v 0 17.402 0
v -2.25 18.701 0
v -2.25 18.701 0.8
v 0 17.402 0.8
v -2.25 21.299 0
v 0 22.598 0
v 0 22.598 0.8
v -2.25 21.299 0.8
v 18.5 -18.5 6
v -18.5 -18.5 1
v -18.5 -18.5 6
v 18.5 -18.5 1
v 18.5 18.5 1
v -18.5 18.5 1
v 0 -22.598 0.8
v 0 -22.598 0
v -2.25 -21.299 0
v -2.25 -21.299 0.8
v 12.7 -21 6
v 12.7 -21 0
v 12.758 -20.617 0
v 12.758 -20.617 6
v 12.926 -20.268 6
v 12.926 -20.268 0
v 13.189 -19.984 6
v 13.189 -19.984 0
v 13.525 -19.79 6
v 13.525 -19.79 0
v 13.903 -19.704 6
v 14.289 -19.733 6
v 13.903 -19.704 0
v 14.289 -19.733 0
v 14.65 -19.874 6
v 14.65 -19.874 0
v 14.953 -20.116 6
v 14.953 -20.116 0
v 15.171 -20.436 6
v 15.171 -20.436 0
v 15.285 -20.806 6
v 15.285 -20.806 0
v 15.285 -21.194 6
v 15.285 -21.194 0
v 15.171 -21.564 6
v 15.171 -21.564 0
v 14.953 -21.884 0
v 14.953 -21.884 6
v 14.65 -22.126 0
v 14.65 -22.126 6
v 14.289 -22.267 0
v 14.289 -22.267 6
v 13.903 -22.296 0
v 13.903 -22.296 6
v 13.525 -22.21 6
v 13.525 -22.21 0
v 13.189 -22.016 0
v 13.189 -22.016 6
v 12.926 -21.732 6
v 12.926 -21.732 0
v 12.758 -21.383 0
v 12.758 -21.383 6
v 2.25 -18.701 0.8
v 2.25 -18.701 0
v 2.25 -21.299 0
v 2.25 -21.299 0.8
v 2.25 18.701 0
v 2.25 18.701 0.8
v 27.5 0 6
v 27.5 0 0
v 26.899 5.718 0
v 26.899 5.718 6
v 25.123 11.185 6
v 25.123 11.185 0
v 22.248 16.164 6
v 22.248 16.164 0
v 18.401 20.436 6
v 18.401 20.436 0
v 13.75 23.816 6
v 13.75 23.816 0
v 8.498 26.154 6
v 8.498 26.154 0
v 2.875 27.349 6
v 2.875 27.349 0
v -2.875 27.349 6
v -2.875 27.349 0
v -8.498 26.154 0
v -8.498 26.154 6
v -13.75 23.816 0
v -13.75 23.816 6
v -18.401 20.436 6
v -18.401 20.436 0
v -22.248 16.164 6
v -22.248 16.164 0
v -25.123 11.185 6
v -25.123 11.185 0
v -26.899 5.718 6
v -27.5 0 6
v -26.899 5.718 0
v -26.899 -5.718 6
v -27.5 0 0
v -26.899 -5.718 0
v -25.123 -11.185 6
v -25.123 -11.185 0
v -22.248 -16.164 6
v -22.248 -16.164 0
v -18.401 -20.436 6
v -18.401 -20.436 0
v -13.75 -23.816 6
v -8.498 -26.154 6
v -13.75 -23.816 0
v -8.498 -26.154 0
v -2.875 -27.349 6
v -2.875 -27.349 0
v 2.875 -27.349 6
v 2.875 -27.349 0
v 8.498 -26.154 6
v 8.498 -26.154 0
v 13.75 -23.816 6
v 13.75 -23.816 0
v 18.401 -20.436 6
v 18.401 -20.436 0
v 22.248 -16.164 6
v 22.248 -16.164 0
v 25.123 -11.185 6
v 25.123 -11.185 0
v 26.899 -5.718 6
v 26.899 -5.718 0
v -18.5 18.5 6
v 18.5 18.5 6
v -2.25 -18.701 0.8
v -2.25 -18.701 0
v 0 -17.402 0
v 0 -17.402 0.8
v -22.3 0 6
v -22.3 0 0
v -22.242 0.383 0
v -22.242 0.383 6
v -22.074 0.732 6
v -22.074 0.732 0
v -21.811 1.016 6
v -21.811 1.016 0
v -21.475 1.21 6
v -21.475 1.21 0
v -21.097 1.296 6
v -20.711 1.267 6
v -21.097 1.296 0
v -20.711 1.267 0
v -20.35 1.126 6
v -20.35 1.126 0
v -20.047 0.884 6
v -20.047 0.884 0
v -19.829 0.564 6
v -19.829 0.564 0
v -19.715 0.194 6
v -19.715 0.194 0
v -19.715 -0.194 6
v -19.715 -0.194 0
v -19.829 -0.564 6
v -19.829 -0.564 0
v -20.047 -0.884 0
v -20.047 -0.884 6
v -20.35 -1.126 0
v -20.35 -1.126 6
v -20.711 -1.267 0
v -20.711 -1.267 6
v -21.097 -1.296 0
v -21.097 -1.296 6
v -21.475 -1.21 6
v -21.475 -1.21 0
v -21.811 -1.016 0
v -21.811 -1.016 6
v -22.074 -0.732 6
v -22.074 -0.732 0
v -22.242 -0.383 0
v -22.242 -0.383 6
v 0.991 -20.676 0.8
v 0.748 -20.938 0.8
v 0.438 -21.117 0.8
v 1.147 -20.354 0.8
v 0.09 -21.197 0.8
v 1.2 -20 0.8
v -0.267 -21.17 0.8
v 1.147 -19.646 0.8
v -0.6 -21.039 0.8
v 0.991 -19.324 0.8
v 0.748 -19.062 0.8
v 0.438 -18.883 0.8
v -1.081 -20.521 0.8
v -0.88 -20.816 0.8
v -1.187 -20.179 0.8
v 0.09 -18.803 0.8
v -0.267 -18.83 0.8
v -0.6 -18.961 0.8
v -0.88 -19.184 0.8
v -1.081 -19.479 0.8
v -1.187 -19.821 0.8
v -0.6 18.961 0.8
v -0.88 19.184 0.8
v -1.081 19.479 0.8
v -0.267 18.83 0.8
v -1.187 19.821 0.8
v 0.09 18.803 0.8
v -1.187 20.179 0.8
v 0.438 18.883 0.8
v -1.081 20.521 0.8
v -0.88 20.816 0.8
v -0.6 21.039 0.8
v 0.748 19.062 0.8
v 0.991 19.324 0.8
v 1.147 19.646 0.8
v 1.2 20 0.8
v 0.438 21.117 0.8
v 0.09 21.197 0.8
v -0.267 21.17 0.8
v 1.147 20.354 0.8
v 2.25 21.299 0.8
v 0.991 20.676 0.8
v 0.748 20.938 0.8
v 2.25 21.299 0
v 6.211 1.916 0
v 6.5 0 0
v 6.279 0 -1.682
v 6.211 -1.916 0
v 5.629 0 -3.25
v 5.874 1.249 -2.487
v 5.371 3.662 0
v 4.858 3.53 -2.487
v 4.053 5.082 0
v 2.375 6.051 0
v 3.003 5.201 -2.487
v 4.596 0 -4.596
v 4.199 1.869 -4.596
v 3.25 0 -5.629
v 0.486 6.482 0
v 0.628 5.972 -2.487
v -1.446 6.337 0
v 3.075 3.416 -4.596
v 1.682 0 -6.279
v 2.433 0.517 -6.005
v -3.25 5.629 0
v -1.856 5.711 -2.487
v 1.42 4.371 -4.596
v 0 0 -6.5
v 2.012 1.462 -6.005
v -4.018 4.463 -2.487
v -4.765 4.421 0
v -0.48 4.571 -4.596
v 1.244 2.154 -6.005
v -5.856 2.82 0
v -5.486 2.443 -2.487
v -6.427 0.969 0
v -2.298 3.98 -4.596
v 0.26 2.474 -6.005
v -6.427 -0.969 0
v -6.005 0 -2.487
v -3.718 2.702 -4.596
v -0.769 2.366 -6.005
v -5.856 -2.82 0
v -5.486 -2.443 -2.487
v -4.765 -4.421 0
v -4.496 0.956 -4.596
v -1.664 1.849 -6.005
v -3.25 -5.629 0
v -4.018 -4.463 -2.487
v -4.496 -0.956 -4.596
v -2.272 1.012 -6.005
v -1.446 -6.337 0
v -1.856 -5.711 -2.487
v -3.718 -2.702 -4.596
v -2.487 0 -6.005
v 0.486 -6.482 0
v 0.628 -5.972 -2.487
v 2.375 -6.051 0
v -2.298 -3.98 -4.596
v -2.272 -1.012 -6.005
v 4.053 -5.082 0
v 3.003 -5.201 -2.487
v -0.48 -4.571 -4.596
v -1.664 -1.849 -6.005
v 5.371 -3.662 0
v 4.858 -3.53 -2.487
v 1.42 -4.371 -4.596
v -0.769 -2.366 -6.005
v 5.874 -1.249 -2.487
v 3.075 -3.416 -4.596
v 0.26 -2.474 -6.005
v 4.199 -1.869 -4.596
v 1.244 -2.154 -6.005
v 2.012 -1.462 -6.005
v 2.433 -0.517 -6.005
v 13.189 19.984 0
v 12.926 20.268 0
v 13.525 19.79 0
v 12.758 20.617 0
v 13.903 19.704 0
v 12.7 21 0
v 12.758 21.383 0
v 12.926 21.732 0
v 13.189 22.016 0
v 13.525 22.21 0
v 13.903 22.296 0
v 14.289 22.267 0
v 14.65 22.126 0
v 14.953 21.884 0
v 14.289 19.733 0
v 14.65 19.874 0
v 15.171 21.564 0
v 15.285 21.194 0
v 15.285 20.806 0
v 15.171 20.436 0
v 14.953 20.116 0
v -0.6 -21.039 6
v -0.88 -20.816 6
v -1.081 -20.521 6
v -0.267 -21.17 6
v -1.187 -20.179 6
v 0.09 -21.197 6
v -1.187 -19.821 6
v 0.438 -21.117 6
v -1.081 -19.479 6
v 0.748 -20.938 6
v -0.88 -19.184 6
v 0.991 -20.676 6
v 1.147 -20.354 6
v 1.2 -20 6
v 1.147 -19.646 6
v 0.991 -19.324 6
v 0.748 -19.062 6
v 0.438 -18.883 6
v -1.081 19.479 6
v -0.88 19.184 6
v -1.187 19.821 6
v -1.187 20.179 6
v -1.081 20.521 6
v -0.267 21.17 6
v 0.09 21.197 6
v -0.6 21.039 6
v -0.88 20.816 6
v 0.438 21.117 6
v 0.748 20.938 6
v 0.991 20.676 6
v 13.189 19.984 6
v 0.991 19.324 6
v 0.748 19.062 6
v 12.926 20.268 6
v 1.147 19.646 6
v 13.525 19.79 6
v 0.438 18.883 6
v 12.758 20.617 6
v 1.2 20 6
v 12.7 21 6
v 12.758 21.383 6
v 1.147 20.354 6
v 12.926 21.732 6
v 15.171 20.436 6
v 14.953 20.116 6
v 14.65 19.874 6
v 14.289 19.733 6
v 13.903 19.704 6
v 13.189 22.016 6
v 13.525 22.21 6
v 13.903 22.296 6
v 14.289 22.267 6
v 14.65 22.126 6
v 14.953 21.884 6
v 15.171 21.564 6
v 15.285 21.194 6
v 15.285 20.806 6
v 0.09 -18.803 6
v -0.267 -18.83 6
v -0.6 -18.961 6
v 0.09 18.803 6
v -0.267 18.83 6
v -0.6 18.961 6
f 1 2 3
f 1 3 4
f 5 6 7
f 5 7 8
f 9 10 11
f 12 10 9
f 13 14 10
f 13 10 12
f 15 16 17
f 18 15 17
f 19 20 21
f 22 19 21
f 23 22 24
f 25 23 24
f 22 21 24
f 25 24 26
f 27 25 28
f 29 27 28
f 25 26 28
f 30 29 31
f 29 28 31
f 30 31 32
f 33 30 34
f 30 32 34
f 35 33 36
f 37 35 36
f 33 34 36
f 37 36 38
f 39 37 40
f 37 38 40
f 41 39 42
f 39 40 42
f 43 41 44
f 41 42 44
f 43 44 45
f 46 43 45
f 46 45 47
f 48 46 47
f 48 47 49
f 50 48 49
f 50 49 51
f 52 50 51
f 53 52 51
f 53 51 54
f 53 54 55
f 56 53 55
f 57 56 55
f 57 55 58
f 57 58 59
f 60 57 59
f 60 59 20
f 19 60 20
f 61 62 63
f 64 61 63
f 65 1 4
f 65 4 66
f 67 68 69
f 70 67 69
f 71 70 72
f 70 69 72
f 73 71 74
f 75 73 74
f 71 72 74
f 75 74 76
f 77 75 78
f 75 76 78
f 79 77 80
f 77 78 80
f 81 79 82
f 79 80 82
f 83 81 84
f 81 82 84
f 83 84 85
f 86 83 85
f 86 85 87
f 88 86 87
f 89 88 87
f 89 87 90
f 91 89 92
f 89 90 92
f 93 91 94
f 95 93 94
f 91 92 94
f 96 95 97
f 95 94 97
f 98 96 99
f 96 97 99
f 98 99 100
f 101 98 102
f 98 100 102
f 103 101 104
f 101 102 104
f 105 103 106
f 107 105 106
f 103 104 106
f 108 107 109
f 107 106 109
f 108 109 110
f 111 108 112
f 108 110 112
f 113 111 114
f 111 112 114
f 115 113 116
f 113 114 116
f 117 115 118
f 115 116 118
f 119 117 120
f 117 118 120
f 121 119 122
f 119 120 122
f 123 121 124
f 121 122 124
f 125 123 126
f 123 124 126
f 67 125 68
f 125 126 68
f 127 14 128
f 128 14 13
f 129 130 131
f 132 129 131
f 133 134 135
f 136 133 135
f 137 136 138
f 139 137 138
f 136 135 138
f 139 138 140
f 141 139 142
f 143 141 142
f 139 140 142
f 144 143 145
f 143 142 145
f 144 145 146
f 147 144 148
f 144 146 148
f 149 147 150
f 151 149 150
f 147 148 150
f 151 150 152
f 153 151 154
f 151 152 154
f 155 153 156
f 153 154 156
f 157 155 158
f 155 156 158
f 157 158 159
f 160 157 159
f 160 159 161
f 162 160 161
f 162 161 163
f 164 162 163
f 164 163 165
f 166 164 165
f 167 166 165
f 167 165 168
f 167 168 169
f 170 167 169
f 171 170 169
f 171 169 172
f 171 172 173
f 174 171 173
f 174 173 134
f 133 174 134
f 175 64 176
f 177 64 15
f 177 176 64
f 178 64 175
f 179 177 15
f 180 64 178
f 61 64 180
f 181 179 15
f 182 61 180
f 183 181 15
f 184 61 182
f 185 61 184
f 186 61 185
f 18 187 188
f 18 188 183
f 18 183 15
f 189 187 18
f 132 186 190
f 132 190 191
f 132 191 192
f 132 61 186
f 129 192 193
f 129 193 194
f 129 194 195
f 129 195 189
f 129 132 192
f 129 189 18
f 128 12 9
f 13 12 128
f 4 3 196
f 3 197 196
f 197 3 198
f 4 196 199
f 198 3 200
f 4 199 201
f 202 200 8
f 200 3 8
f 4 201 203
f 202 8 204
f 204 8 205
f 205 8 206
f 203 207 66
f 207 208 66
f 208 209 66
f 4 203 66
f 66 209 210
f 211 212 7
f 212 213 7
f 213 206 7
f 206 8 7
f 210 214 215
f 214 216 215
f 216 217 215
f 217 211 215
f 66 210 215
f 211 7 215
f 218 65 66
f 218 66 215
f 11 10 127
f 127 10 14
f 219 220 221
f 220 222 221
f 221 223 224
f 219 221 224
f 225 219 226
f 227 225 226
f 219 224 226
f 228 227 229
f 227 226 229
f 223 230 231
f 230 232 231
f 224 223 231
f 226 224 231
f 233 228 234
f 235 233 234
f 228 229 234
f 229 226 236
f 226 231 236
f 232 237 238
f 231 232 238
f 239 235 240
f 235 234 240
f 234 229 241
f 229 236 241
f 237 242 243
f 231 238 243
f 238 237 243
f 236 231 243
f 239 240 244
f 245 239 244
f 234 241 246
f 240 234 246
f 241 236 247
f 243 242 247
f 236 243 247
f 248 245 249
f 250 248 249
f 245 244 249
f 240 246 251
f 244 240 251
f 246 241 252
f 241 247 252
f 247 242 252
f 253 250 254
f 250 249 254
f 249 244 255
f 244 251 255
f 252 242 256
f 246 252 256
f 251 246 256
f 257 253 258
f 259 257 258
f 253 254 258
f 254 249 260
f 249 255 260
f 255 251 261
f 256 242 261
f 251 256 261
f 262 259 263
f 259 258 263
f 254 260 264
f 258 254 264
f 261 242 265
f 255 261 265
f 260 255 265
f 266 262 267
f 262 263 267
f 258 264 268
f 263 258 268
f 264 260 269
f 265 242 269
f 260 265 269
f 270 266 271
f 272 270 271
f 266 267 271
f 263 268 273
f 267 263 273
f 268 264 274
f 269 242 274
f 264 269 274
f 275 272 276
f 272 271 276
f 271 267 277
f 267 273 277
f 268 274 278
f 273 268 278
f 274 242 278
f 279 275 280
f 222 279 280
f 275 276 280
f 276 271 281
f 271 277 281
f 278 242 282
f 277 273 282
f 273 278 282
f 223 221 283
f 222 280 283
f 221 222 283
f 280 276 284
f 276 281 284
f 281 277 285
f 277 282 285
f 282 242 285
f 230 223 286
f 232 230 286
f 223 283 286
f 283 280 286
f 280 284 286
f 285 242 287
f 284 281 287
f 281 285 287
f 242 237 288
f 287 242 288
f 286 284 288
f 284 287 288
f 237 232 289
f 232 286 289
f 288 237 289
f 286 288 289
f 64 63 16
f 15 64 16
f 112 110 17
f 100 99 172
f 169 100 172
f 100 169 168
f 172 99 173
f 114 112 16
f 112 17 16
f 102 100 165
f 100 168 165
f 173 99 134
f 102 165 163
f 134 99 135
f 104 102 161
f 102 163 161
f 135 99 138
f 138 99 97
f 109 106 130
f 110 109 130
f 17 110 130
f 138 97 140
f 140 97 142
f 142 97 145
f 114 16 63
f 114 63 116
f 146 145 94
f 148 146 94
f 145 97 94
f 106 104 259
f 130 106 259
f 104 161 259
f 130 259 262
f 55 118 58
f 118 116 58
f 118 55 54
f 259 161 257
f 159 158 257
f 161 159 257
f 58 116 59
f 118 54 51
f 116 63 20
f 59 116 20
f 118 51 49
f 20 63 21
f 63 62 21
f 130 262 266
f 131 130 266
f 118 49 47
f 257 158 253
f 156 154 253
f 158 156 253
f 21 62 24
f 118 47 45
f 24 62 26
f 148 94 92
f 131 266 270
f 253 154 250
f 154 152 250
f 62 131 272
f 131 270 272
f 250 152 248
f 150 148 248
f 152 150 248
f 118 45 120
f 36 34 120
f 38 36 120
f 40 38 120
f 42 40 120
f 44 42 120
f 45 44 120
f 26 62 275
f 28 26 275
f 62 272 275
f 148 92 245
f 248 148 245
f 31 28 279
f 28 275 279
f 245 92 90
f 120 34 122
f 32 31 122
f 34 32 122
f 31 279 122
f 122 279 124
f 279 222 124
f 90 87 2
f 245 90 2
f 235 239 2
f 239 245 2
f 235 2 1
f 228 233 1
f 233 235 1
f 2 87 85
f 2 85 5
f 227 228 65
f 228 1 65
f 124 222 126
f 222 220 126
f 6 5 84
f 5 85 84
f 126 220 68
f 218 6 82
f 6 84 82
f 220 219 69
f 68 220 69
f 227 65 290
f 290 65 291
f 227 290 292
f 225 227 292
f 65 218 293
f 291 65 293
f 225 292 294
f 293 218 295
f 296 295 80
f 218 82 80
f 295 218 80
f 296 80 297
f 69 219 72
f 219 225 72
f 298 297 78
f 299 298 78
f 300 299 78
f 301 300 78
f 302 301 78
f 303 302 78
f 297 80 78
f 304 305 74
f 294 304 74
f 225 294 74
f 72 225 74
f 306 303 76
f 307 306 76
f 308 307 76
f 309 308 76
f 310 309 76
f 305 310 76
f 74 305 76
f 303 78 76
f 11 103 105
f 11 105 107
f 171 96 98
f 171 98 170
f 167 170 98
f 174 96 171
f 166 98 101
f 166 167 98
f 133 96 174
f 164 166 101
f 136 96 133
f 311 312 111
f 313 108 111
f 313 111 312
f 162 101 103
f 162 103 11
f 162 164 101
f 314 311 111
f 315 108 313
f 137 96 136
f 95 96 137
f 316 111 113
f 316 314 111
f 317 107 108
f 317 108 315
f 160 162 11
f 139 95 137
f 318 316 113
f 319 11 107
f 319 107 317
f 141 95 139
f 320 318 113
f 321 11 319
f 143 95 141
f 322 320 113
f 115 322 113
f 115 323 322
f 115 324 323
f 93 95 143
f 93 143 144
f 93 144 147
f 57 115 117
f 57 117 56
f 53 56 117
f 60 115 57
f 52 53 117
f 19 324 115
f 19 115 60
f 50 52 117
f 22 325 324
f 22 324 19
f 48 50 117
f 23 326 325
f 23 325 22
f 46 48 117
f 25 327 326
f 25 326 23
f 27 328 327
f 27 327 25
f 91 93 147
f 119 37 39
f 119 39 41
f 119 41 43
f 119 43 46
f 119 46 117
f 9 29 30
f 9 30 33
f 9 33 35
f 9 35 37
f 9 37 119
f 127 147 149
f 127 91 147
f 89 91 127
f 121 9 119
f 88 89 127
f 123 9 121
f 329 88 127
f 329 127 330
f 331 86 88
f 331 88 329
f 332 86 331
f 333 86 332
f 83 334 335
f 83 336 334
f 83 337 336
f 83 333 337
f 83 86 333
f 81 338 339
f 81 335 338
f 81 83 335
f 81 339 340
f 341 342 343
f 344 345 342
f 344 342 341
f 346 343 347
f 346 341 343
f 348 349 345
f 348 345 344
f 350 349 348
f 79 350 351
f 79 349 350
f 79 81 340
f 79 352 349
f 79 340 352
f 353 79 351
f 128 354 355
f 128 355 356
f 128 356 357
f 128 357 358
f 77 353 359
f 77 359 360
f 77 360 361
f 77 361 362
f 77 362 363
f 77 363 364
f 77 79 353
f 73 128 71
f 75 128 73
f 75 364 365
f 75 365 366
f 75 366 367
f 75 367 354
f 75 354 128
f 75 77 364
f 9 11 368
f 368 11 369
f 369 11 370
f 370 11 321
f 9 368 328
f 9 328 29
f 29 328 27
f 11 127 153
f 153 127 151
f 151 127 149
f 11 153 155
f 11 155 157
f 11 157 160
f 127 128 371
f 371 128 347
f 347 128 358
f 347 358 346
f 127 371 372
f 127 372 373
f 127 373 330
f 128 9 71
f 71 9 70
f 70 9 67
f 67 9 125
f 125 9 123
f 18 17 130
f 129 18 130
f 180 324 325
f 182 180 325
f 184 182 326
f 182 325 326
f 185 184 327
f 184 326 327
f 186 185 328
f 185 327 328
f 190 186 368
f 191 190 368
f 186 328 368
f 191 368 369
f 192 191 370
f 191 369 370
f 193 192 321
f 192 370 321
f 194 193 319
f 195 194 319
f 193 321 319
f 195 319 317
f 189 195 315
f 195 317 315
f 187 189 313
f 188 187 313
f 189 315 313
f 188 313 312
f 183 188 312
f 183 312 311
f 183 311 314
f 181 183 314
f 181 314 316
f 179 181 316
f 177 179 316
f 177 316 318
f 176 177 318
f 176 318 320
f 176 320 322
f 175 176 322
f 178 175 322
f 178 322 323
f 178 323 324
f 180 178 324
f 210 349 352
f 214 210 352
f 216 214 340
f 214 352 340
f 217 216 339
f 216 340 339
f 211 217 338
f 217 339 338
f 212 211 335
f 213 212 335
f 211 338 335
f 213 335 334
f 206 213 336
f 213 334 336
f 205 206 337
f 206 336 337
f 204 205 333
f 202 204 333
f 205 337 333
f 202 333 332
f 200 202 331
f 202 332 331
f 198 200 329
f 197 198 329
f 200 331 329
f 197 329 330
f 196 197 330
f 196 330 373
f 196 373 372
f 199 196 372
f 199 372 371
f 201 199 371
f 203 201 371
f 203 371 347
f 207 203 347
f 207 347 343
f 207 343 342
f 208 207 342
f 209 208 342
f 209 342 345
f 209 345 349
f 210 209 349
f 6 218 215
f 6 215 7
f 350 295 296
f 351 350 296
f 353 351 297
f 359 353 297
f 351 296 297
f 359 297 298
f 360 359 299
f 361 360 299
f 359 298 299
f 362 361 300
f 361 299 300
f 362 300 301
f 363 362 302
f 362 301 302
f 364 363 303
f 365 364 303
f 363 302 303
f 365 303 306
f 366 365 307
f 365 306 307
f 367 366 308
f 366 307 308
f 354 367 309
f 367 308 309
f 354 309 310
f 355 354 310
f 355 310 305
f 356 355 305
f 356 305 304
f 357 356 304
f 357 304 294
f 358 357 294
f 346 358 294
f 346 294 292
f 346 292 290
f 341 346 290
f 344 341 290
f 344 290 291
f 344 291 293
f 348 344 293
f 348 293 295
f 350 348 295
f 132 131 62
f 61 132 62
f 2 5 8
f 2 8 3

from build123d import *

# Parameters (mm, degrees)
SKETCH1_R            = 27.5
SKETCH1_W            = 37
SKETCH1_H            = 37
BOSS_EXTRUDE1_DEPTH  = 6
SKETCH1_3_W          = 37
SKETCH1_3_H          = 37
BOSS_EXTRUDE2_DEPTH  = 1
M2_CLEARANCE_HOLE1_D = 2.6
M2_CLEARANCE_HOLE2_D = 2.4
CUT_EXTRUDE3_DEPTH   = 0.8


with BuildPart() as part:
    # Sketch1 → Boss-Extrude1 (new body)
    with BuildSketch(Plane.XY):
        Circle(SKETCH1_R)
        Rectangle(SKETCH1_W, SKETCH1_H, mode=Mode.SUBTRACT)
    extrude(amount=BOSS_EXTRUDE1_DEPTH)

    # Sketch1<3> → Boss-Extrude2 (add)
    with BuildSketch(Plane.XY):
        Rectangle(SKETCH1_3_W, SKETCH1_3_H)
    extrude(amount=BOSS_EXTRUDE2_DEPTH)

    # Sketch2 → Revolve1 (revolve)
    with BuildSketch(Plane(origin=(0, 0, 0), x_dir=(1, 0, 0), z_dir=(0, 1, 0))):
        with BuildLine():
            Line((0, 6.5), (0, 0))
            Line((0, 0), (-6.5, 0))
            ThreePointArc((-6.5, 0), (-4.596194078, 4.596194078), (0, 6.5))
        make_face()
    revolve(axis=Axis((0, 0, -15), (0, 0, 1)))

    # M2 Clearance Hole1 (through all)
    with Locations(Plane.XY.offset(6)):
        with Locations((-21, 0), (14, -21), (14, 21)):
            Hole(M2_CLEARANCE_HOLE1_D / 2)

    # M2 Clearance Hole2 (through all)
    with Locations(Plane(origin=(0, 20, 0), x_dir=(-1, 0, 0), z_dir=(0, 0, -1))):
        with Locations((0, 0), (0, -40)):
            Hole(M2_CLEARANCE_HOLE2_D / 2)

    # Sketch5 → Cut-Extrude3 (cut)
    with BuildSketch(Plane.XY):
        Polygon((0, 17.401923789), (2.25, 18.700961894), (2.25, 21.299038106), (0, 22.598076211), (-2.25, 21.299038106), (-2.25, 18.700961894), align=None)
        Polygon((-2.25, -18.700961894), (0, -17.401923789), (2.25, -18.700961894), (2.25, -21.299038106), (0, -22.598076211), (-2.25, -21.299038106), align=None)
    extrude(amount=CUT_EXTRUDE3_DEPTH, mode=Mode.SUBTRACT)


solid = part.part
